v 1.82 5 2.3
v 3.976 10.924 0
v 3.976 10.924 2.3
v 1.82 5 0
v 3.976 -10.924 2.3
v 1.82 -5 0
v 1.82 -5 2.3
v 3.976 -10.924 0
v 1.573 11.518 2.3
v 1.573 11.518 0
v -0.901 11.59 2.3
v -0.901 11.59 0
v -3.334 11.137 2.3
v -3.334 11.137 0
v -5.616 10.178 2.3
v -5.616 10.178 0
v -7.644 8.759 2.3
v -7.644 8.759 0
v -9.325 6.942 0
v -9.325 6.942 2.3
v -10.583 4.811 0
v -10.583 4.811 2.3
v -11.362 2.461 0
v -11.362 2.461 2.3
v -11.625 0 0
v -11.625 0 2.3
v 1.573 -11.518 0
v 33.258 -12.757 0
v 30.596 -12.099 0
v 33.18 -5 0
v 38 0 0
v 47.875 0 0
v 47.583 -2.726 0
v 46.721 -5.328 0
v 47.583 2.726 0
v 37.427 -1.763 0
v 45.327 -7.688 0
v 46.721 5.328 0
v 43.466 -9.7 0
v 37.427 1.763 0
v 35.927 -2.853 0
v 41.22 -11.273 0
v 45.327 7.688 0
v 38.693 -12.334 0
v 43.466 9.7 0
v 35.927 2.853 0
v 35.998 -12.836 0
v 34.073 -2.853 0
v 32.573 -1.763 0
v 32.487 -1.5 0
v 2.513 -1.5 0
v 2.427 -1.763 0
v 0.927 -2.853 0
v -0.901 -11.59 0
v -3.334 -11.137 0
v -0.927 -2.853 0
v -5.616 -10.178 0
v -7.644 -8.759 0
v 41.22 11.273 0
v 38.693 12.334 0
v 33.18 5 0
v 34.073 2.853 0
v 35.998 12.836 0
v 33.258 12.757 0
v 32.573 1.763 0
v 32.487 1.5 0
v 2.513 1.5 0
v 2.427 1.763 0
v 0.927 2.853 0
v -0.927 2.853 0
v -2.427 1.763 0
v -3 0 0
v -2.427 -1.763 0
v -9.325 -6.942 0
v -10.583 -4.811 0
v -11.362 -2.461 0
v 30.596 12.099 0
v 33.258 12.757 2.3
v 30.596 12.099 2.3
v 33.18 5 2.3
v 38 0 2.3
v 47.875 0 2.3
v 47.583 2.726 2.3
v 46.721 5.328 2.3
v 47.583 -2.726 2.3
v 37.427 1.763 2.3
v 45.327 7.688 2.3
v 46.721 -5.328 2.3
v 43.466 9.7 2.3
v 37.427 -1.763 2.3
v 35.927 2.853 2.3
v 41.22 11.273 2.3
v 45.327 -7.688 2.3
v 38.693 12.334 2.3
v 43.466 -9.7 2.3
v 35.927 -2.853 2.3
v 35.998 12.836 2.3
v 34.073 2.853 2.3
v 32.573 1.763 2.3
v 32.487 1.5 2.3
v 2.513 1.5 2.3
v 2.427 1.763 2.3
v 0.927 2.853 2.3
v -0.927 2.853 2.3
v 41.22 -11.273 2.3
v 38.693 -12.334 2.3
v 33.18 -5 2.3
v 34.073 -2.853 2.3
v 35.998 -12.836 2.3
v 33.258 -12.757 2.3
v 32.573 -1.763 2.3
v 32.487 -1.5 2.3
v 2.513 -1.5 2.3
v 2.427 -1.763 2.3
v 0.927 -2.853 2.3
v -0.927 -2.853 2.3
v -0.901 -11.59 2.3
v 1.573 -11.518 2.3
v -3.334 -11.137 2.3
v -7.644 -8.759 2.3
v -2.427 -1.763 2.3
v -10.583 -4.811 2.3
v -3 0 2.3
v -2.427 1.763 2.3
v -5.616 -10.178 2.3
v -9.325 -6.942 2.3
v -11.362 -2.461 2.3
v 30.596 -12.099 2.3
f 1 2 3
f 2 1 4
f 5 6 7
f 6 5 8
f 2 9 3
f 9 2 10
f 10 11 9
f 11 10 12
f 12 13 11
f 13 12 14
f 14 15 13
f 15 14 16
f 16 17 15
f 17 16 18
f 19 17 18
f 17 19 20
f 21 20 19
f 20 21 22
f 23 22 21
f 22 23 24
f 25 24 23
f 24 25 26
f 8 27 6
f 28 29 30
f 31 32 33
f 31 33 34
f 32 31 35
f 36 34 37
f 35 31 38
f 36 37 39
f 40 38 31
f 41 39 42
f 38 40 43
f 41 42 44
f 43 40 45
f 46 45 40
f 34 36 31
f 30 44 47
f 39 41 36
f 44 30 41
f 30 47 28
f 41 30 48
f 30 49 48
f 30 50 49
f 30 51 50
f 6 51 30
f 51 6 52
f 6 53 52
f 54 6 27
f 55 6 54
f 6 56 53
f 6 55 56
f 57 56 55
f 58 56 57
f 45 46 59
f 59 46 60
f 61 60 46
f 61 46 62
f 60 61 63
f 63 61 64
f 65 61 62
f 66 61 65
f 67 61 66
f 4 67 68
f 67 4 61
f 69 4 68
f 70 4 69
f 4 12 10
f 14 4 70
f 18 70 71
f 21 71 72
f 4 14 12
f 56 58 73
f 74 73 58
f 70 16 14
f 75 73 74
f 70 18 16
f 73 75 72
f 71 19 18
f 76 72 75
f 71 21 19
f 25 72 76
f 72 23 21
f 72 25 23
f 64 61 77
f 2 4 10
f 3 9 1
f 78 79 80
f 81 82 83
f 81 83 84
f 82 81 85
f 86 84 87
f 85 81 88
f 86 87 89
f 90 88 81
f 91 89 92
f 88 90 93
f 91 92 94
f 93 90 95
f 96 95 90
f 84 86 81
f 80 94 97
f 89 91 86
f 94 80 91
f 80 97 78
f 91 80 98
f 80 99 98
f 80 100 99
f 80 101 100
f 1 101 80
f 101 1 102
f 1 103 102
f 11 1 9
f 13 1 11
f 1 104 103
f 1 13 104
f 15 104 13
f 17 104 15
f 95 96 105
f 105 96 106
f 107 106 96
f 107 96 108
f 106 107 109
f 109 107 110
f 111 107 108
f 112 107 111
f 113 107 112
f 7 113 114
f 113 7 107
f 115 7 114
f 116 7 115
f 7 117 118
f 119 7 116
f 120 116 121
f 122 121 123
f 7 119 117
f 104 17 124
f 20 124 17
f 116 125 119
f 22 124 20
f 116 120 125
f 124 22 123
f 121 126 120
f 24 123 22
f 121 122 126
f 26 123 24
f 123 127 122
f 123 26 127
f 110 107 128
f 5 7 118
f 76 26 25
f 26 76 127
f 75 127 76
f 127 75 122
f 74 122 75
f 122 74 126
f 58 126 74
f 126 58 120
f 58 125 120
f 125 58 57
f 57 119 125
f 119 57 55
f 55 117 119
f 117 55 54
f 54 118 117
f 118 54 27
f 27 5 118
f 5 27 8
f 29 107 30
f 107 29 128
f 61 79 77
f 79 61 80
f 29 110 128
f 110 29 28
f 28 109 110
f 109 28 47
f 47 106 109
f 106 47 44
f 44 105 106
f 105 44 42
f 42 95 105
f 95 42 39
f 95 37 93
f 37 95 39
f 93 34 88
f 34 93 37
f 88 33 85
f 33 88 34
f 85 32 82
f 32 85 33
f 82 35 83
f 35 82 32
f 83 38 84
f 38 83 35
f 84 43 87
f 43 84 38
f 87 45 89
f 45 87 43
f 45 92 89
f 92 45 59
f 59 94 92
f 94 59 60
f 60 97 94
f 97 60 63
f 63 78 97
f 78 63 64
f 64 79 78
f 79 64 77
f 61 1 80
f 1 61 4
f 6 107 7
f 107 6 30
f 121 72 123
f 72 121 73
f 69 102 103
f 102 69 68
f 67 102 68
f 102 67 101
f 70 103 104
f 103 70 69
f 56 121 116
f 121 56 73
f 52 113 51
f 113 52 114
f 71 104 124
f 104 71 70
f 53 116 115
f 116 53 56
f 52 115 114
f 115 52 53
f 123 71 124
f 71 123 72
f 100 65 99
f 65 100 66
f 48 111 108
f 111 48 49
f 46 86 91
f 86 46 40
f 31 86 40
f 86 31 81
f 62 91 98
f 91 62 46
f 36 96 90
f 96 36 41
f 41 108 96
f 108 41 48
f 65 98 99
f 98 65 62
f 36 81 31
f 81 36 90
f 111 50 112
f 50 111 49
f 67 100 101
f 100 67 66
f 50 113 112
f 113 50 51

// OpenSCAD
e1_dia=23.25;
e2_dia=25.75;
h=2.3;
dist=35;
slot_w=3;
joiner_w=10;
hole_dia=6;
angle=220;


module coin(dia) {

rotate_extrude(angle=angle) square([0.5*dia, h]);

}



module key() {
rotate([0, 0, 0.5*(180-angle)+90]) coin(e1_dia);
translate([dist, 0, 0]) rotate([0, 0, 0.5*(180-angle)-90]) coin(e2_dia);
translate([0, -0.5*joiner_w, 0]) cube([dist, joiner_w, h]);
}

module cut_out() {
cylinder(d=hole_dia, h=h);
translate([dist, 0, 0]) cylinder(d=hole_dia, h=h);
translate([0, -0.5*slot_w, 0]) cube([dist, slot_w, h]);
}


difference() {
key();
cut_out();
}
